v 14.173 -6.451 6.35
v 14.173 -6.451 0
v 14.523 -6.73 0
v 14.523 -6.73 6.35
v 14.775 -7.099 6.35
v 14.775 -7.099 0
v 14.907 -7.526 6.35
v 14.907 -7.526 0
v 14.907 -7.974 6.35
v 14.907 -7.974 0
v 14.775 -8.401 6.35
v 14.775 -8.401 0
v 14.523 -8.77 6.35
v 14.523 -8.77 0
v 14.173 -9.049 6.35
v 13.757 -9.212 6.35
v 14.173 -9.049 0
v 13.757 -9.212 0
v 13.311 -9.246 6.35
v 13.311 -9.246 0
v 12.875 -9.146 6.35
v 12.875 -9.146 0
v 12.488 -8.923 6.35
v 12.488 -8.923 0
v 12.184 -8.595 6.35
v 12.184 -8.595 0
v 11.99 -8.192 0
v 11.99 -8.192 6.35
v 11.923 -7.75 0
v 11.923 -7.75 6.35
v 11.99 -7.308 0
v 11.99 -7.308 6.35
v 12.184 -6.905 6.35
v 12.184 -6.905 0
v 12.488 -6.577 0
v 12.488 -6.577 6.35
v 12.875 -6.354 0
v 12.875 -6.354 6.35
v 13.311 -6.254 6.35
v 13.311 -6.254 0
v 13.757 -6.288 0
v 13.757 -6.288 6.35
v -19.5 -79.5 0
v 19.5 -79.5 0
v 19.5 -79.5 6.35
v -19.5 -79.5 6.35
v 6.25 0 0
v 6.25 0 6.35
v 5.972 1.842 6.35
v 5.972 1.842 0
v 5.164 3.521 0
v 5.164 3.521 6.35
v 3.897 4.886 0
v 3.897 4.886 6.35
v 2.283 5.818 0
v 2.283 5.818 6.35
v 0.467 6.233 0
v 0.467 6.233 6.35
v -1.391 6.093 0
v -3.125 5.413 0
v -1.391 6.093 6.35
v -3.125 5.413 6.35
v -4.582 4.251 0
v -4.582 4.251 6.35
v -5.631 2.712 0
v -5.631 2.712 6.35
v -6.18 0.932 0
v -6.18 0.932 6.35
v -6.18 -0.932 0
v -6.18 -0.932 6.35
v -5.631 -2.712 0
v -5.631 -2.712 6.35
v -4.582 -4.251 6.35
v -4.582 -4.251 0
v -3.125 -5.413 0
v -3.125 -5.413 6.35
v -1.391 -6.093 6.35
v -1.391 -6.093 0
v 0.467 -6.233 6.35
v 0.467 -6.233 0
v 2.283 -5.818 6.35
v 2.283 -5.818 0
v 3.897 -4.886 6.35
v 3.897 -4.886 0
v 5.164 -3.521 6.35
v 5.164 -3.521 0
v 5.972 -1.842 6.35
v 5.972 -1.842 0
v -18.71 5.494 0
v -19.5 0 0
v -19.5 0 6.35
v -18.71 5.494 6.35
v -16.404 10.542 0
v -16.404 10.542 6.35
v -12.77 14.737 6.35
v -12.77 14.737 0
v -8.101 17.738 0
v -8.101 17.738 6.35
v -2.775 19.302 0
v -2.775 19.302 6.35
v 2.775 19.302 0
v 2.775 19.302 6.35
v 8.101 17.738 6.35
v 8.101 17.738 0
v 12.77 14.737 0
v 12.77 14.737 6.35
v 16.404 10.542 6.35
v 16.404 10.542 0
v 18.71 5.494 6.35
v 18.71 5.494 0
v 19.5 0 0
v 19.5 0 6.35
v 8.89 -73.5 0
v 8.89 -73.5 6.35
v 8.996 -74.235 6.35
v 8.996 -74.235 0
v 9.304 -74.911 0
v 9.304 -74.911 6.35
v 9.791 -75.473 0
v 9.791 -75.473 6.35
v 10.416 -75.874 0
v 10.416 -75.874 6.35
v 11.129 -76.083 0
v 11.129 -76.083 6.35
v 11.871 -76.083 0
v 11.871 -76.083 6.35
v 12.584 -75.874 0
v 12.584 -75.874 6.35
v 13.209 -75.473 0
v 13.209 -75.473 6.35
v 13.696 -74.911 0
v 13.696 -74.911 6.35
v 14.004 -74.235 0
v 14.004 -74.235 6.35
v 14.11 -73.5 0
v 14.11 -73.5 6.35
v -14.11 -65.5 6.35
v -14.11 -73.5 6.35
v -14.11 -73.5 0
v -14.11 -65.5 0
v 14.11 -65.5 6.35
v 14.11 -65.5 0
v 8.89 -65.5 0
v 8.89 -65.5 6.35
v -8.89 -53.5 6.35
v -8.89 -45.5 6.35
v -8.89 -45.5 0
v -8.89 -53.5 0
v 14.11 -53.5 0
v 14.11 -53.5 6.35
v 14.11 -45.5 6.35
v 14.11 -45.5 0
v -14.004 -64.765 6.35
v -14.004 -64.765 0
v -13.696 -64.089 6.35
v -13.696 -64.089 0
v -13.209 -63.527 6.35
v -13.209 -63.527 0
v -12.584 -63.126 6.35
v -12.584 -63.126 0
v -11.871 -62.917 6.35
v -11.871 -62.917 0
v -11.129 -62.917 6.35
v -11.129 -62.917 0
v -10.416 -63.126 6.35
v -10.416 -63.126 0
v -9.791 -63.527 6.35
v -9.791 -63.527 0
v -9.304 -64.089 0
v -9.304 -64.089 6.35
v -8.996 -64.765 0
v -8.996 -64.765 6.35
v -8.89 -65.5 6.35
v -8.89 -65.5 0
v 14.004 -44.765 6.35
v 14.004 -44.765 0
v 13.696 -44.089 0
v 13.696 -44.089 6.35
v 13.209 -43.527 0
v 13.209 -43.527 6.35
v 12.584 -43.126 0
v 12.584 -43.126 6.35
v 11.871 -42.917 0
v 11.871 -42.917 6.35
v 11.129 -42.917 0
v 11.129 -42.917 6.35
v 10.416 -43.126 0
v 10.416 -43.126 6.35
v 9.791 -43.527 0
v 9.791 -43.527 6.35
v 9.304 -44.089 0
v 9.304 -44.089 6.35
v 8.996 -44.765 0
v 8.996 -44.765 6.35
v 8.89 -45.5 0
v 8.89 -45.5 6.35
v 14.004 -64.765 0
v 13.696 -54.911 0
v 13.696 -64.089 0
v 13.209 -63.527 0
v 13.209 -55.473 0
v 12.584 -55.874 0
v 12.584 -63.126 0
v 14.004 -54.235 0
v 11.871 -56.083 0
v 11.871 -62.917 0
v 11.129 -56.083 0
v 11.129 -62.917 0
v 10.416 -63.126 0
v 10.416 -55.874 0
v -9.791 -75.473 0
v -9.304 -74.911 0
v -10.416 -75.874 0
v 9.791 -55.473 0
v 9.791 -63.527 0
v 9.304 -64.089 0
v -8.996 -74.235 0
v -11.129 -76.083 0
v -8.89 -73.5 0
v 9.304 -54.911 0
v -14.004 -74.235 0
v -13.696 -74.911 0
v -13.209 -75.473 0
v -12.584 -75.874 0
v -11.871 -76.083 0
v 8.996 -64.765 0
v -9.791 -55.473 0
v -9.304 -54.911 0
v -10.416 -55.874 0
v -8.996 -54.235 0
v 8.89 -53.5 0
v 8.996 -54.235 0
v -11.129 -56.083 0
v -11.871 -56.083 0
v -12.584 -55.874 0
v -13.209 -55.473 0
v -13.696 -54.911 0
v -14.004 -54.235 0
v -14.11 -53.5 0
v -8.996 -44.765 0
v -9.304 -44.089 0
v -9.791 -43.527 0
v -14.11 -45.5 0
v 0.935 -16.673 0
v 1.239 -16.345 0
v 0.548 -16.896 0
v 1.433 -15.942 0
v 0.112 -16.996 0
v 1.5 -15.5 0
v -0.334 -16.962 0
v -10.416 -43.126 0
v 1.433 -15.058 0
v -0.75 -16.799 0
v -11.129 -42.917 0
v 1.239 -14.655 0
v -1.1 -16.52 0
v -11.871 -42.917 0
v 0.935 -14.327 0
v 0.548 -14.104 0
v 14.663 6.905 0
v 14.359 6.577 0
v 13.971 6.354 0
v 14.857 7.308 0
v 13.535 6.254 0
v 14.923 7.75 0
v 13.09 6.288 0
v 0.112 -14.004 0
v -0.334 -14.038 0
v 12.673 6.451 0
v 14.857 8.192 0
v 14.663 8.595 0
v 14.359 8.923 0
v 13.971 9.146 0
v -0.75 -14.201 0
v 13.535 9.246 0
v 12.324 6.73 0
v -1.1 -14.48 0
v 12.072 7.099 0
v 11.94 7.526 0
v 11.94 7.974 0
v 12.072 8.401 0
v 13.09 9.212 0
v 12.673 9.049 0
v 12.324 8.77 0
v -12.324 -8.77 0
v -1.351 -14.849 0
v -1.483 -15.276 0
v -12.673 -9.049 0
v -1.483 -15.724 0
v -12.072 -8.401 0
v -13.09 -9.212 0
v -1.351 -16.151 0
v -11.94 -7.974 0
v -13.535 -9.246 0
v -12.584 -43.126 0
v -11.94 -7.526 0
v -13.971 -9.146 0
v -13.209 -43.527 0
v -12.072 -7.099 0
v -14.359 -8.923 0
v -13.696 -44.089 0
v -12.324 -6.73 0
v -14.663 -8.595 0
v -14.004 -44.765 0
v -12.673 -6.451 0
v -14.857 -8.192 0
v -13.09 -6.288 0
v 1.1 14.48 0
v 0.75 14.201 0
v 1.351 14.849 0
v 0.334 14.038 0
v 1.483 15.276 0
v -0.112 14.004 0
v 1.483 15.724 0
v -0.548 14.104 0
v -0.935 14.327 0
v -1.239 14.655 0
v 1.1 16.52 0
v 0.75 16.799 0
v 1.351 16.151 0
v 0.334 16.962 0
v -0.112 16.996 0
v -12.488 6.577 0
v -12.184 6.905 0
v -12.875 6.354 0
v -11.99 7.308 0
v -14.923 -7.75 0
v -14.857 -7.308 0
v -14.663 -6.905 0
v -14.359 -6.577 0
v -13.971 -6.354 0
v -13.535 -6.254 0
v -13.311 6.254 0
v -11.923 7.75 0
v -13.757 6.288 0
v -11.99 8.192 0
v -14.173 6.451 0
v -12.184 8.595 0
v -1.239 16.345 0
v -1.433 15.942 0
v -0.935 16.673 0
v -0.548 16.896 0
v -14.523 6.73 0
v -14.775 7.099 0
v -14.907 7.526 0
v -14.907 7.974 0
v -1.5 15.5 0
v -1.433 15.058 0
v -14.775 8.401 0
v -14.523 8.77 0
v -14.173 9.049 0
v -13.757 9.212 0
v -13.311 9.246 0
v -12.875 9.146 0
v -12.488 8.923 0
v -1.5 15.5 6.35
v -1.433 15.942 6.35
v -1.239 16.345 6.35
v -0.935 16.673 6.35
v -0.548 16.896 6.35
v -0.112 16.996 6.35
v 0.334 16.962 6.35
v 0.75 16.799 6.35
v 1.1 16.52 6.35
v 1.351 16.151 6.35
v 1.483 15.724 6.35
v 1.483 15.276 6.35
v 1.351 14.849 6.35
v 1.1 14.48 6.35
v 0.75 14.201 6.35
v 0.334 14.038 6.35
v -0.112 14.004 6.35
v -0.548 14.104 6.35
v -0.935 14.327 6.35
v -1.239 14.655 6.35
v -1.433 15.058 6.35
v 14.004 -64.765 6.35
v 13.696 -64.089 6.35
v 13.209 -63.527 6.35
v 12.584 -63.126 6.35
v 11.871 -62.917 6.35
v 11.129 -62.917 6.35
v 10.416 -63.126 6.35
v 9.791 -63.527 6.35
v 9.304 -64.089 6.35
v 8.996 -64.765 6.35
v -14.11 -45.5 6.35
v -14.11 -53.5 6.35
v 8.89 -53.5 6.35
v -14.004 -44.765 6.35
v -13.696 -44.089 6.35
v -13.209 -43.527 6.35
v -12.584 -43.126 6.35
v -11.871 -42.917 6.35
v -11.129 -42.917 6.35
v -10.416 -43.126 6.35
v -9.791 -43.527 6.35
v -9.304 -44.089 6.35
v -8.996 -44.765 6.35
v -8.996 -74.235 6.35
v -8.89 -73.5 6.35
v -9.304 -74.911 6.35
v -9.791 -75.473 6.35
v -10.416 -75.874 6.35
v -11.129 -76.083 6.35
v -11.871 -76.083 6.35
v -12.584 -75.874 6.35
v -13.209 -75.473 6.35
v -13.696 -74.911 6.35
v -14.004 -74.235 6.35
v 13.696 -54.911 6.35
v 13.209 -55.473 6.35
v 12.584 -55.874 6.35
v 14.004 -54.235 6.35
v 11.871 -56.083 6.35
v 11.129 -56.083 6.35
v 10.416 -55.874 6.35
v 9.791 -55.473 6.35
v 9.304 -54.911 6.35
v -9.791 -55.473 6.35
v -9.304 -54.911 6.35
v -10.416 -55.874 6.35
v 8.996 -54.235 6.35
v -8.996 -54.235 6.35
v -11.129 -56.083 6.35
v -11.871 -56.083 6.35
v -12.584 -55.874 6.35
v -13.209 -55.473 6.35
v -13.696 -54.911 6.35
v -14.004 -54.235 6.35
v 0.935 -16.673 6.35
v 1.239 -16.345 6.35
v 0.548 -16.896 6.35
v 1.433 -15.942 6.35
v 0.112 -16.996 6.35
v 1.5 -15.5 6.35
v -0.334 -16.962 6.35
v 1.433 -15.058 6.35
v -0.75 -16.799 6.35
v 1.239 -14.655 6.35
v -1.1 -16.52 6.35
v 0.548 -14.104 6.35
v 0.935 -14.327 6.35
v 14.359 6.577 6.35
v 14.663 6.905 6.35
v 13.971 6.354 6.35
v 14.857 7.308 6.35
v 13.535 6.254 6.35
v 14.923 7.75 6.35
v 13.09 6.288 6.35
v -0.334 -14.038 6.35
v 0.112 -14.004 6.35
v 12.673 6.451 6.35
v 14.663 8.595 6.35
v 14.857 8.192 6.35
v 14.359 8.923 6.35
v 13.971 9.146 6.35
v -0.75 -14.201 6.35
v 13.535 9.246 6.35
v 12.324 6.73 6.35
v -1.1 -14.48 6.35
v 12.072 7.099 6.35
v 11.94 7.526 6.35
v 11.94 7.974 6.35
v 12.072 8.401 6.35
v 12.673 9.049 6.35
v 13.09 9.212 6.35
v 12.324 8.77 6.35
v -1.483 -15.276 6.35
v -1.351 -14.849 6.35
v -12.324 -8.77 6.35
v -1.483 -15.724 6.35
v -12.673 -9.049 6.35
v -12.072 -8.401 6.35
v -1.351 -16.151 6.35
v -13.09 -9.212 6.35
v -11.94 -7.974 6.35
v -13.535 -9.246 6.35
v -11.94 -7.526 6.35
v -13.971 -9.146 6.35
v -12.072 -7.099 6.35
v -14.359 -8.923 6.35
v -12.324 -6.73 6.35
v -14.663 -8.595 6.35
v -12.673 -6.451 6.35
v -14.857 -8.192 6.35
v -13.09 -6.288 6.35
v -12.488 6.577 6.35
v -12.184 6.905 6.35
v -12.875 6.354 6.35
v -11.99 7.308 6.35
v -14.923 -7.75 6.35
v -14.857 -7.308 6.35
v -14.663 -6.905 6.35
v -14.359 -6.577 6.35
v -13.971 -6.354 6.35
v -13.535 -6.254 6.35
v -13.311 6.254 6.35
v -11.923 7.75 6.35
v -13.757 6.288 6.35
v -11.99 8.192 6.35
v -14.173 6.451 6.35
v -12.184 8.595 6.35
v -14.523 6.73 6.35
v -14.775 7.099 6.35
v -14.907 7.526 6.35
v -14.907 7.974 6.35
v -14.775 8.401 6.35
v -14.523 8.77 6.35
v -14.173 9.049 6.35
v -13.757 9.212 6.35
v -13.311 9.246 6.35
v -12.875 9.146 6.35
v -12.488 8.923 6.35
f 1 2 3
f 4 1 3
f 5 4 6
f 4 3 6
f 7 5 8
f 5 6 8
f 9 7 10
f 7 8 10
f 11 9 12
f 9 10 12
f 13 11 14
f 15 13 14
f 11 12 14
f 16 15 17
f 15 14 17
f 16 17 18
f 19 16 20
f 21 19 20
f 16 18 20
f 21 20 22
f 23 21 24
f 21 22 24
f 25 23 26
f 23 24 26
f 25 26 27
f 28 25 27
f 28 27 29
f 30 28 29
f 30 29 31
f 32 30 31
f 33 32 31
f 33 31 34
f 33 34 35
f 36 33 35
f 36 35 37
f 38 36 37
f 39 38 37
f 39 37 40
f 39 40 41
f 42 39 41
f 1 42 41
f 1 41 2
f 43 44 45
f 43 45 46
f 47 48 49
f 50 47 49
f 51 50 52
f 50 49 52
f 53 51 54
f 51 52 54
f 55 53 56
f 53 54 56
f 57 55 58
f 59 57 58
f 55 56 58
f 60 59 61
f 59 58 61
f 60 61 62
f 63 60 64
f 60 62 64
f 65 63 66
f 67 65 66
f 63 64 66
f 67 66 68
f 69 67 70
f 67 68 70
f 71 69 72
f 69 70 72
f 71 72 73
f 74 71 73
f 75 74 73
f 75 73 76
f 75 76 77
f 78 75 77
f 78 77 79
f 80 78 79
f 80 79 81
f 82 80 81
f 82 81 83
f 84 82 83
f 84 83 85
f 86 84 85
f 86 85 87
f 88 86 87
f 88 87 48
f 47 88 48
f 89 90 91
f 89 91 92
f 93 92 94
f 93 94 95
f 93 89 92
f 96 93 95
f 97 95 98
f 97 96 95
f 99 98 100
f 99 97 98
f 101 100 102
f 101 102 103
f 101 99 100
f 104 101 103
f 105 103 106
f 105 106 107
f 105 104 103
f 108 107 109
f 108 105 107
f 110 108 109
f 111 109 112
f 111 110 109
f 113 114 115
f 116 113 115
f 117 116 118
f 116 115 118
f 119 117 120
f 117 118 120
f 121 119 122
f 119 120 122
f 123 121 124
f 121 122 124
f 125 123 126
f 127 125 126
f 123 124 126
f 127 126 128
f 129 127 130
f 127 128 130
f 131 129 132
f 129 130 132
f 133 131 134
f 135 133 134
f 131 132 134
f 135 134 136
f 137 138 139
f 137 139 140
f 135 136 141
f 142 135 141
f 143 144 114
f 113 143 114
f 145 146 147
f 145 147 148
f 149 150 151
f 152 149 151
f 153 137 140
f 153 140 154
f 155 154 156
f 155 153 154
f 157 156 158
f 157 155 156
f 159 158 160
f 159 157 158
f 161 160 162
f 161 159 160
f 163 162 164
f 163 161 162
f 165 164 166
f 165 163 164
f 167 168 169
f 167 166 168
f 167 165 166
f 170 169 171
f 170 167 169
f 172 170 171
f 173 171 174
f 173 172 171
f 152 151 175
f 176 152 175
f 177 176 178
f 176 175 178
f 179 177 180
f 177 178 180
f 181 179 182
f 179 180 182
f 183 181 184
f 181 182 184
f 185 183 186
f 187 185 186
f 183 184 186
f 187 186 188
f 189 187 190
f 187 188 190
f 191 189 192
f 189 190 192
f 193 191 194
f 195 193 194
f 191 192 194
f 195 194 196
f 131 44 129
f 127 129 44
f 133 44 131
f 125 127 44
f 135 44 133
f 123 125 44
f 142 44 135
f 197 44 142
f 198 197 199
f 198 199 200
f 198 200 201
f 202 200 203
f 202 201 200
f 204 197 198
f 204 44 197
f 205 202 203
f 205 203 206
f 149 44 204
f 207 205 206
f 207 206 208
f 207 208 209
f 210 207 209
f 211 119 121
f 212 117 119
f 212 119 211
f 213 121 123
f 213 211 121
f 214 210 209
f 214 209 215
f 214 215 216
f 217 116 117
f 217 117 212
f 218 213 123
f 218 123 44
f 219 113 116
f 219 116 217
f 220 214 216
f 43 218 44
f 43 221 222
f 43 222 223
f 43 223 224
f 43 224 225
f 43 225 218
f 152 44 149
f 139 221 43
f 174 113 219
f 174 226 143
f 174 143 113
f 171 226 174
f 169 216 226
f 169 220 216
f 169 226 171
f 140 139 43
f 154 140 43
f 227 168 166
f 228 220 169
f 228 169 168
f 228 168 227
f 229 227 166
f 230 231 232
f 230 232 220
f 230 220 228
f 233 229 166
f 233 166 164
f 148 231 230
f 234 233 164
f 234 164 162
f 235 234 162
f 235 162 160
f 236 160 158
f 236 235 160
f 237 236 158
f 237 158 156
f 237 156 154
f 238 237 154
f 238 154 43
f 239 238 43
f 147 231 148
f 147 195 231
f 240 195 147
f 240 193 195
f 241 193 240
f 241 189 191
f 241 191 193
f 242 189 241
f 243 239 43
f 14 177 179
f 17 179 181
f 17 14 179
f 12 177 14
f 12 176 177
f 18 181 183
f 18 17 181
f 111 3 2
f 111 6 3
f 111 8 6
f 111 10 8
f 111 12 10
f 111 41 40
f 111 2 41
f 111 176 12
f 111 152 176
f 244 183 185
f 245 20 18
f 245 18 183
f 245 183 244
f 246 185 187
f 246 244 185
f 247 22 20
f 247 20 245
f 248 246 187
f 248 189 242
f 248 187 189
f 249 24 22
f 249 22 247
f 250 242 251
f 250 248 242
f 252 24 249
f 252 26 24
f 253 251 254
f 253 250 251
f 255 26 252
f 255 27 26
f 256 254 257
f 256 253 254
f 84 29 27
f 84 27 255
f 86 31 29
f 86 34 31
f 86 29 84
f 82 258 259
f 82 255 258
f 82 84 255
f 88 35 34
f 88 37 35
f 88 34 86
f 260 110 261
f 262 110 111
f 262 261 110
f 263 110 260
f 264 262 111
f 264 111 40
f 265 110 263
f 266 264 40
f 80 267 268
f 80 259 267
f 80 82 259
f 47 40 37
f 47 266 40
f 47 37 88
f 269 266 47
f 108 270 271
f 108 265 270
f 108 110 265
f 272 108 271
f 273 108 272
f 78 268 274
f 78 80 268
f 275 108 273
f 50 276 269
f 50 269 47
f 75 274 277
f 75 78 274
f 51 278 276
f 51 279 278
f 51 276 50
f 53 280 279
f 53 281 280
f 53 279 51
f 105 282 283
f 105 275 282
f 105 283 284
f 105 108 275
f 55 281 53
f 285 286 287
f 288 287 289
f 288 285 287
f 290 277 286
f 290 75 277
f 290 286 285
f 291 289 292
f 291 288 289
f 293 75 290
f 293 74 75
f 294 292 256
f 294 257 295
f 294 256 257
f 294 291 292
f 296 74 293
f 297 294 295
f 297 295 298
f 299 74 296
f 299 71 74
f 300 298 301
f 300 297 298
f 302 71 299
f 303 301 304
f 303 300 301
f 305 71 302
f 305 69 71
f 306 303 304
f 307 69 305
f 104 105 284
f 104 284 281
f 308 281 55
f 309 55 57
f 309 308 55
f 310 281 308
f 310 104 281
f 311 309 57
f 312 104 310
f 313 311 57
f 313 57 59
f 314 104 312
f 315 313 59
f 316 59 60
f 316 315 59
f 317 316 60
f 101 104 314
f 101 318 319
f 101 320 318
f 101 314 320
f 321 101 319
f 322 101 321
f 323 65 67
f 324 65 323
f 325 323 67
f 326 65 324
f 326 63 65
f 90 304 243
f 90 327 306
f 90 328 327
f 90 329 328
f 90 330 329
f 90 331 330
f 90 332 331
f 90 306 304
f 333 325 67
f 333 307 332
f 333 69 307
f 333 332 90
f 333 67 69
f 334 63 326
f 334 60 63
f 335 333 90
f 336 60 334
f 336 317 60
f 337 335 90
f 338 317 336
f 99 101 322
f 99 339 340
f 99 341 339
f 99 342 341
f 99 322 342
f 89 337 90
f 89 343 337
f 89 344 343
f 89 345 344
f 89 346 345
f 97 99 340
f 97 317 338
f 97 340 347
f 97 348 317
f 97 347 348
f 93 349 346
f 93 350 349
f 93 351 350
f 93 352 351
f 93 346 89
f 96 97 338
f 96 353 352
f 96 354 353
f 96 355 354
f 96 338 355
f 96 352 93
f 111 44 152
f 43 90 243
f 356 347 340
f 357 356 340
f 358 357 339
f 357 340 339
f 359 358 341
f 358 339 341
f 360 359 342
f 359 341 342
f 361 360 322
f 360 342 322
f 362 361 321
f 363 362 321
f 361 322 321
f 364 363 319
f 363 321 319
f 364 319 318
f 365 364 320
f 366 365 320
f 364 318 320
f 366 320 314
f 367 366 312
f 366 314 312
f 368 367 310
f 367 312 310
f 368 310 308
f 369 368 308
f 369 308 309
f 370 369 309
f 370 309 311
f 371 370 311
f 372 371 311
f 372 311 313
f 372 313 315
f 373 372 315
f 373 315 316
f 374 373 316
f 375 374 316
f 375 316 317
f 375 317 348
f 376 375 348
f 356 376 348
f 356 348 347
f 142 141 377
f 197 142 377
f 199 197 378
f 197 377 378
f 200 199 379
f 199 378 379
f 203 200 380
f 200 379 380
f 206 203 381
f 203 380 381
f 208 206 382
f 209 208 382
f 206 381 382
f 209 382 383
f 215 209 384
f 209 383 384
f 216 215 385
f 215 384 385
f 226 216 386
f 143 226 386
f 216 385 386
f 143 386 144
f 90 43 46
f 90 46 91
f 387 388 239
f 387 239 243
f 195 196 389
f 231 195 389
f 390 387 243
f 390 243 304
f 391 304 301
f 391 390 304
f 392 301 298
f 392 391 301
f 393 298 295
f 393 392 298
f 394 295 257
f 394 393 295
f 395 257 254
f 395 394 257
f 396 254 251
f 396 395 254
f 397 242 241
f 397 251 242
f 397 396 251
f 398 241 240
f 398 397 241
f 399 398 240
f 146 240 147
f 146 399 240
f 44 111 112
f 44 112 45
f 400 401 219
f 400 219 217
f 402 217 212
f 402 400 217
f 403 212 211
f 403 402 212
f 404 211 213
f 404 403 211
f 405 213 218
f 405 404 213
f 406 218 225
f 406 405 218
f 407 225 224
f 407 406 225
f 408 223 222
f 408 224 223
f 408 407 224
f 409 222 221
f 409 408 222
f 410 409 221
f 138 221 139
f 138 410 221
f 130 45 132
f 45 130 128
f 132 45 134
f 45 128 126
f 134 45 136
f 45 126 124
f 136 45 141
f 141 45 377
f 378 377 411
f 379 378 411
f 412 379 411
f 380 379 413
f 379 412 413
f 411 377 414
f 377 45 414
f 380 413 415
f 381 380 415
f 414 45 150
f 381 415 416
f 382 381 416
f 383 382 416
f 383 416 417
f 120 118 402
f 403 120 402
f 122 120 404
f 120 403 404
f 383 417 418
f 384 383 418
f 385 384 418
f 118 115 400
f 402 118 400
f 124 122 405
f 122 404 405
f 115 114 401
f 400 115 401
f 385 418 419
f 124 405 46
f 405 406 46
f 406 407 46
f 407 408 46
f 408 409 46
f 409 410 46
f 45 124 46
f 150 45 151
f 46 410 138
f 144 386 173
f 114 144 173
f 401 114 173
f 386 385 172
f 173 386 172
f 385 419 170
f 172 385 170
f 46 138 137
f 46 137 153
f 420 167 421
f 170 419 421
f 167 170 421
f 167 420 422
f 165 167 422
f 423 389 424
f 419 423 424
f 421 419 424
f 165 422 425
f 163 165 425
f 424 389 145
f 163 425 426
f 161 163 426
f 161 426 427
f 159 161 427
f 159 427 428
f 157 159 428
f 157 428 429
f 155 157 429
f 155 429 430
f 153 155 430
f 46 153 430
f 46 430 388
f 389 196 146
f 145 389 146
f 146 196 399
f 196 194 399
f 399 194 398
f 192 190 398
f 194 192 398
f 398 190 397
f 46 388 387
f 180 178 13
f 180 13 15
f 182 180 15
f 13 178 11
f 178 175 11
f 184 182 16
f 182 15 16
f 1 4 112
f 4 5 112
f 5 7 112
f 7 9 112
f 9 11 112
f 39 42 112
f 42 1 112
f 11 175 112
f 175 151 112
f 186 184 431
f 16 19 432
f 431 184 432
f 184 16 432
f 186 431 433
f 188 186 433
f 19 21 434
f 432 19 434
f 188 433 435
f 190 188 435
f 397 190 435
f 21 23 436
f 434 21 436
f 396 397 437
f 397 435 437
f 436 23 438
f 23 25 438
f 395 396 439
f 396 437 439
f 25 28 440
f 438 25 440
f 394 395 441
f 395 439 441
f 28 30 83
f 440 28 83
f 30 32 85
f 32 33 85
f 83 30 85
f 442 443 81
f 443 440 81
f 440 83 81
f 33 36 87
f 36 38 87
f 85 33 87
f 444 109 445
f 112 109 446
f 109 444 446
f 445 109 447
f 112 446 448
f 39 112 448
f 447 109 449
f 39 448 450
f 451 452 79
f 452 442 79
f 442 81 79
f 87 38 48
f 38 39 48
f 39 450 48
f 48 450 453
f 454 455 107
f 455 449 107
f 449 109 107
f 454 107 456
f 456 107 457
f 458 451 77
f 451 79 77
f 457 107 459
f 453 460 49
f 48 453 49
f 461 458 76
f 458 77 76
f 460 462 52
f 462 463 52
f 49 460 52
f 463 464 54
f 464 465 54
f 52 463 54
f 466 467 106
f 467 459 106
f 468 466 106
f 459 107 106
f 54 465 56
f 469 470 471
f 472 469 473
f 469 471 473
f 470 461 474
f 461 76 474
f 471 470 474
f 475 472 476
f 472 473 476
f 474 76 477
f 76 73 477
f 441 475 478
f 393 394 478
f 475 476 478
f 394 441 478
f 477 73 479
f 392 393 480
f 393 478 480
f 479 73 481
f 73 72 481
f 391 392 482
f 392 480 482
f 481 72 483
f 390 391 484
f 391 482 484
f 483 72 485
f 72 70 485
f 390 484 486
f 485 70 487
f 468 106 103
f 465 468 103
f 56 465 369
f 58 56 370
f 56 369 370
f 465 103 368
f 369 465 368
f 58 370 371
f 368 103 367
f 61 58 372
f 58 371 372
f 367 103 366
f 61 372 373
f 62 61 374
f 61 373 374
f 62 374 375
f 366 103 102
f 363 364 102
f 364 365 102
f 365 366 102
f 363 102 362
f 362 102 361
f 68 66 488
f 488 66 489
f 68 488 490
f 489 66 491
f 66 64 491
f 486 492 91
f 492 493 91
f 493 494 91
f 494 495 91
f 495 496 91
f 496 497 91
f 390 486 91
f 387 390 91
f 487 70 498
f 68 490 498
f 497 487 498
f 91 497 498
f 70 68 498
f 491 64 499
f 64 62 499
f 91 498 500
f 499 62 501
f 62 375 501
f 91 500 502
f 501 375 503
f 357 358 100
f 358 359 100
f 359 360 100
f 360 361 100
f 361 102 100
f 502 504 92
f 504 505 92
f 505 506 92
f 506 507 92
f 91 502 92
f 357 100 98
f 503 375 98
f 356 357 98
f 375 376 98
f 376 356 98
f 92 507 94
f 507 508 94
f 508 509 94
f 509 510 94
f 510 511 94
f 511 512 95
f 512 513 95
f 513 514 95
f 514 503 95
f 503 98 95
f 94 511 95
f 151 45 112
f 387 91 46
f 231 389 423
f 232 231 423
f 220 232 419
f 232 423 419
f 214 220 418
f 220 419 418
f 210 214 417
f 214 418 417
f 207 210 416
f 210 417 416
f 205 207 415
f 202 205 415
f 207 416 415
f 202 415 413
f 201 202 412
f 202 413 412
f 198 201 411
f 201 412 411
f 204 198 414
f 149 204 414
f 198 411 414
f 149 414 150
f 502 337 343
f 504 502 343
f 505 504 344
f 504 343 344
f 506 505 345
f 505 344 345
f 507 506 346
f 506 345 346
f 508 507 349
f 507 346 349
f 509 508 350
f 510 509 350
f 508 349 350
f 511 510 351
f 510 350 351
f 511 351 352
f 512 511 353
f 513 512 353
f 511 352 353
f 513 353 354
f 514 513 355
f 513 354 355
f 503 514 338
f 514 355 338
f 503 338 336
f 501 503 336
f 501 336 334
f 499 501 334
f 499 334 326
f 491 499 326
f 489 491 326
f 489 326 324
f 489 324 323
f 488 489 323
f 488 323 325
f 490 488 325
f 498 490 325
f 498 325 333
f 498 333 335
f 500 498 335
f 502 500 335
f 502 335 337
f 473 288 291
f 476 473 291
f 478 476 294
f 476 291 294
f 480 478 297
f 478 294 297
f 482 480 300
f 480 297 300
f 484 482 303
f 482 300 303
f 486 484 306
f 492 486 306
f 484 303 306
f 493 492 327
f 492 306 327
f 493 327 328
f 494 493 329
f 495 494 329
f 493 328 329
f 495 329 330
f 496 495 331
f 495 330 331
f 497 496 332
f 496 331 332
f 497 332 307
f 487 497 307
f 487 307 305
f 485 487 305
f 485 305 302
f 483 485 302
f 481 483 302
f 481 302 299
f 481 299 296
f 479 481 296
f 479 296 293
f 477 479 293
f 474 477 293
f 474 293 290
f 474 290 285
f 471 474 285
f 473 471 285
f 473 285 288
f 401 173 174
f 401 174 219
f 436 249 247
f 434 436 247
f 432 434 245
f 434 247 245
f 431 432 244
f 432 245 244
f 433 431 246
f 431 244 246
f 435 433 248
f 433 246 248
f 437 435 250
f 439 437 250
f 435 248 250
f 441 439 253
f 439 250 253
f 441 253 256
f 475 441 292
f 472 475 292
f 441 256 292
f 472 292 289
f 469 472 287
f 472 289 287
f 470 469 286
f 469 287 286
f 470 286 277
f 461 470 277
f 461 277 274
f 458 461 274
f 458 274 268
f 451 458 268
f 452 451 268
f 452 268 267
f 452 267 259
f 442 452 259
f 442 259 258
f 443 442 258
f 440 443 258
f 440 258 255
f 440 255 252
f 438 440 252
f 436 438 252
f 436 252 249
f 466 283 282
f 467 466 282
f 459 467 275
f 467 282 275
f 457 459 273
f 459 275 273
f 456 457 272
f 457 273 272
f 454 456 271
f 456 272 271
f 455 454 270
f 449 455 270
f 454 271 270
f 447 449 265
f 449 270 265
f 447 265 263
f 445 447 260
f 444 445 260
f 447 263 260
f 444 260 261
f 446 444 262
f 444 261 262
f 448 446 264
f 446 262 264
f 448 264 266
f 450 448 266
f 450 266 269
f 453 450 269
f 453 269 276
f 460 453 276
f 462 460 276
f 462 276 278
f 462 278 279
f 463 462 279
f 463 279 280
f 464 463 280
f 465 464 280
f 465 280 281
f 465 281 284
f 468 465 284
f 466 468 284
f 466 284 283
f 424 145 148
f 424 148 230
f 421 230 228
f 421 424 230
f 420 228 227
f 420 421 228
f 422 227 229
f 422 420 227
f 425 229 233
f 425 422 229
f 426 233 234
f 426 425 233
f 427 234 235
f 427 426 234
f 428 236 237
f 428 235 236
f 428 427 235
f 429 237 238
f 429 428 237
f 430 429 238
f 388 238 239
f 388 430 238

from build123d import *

# Parameters (mm, degrees)
BOSS_EXTRUDE1_DEPTH             = 6.35
CUT_EXTRUDE1_REACH              = 84.103
CUT_EXTRUDE2_REACH              = 84.103
SKETCH3_R                       = 6.25
F_3_0MM_CLEARANCE_DOWEL_HOLE1_D = 3
CIRPATTERN1_COUNT               = 6


with BuildPart() as part:
    # Sketch1 → Boss-Extrude1 (new body)
    with BuildSketch(Plane.XY):
        with BuildLine():
            Line((19.5, 0), (19.5, -79.5))
            Line((19.5, -79.5), (-19.5, -79.5))
            Line((-19.5, -79.5), (-19.5, 0))
            ThreePointArc((-19.5, 0), (0, 19.5), (19.5, 0))
        make_face()
    extrude(amount=BOSS_EXTRUDE1_DEPTH)

    # Sketch2 → Cut-Extrude1 (cut, up to next)
    with BuildSketch(Plane.XY.offset(6.35), mode=Mode.PRIVATE) as cut_extrude1_sk1:
        with BuildLine():
            Line((-14.11, -73.5), (-14.11, -65.5))
            ThreePointArc((-14.11, -65.5), (-11.5, -62.89), (-8.89, -65.5))
            Line((-8.89, -65.5), (-8.89, -73.5))
            ThreePointArc((-8.89, -73.5), (-11.5, -76.11), (-14.11, -73.5))
        make_face()
    cut_extrude1_tool1 = extrude(cut_extrude1_sk1.sketch, amount=-CUT_EXTRUDE1_REACH, mode=Mode.PRIVATE) & part.part
    # Sketch2 → Cut-Extrude1 (cut, up to next)
    with BuildSketch(Plane.XY.offset(6.35), mode=Mode.PRIVATE) as cut_extrude1_sk2:
        with BuildLine():
            Line((-14.11, -53.5), (-14.11, -45.5))
            ThreePointArc((-14.11, -45.5), (-11.5, -42.89), (-8.89, -45.5))
            Line((-8.89, -45.5), (-8.89, -53.5))
            ThreePointArc((-8.89, -53.5), (-11.5, -56.11), (-14.11, -53.5))
        make_face()
    cut_extrude1_tool2 = extrude(cut_extrude1_sk2.sketch, amount=-CUT_EXTRUDE1_REACH, mode=Mode.PRIVATE) & part.part
    # Sketch2 → Cut-Extrude1 (cut, up to next)
    with BuildSketch(Plane.XY.offset(6.35), mode=Mode.PRIVATE) as cut_extrude1_sk3:
        with BuildLine():
            Line((14.11, -73.5), (14.11, -65.5))
            ThreePointArc((14.11, -65.5), (11.5, -62.89), (8.89, -65.5))
            Line((8.89, -65.5), (8.89, -73.5))
            ThreePointArc((8.89, -73.5), (11.5, -76.11), (14.11, -73.5))
        make_face()
    cut_extrude1_tool3 = extrude(cut_extrude1_sk3.sketch, amount=-CUT_EXTRUDE1_REACH, mode=Mode.PRIVATE) & part.part
    # Sketch2 → Cut-Extrude1 (cut, up to next)
    with BuildSketch(Plane.XY.offset(6.35), mode=Mode.PRIVATE) as cut_extrude1_sk4:
        with BuildLine():
            Line((14.11, -53.5), (14.11, -45.5))
            ThreePointArc((14.11, -45.5), (11.5, -42.89), (8.89, -45.5))
            Line((8.89, -45.5), (8.89, -53.5))
            ThreePointArc((8.89, -53.5), (11.5, -56.11), (14.11, -53.5))
        make_face()
    cut_extrude1_tool4 = extrude(cut_extrude1_sk4.sketch, amount=-CUT_EXTRUDE1_REACH, mode=Mode.PRIVATE) & part.part
    add(cut_extrude1_tool1.solids().sort_by_distance((-11.5, -69.5, 6.35))[0], mode=Mode.SUBTRACT)
    add(cut_extrude1_tool2.solids().sort_by_distance((-11.5, -49.5, 6.35))[0], mode=Mode.SUBTRACT)
    add(cut_extrude1_tool3.solids().sort_by_distance((11.5, -69.5, 6.35))[0], mode=Mode.SUBTRACT)
    add(cut_extrude1_tool4.solids().sort_by_distance((11.5, -49.5, 6.35))[0], mode=Mode.SUBTRACT)

    # Sketch3 → Cut-Extrude2 (cut, up to next)
    with BuildSketch(Plane.XY.offset(6.35), mode=Mode.PRIVATE) as cut_extrude2_sk1:
        Circle(SKETCH3_R)
    cut_extrude2_tool1 = extrude(cut_extrude2_sk1.sketch, amount=-CUT_EXTRUDE2_REACH, mode=Mode.PRIVATE) & part.part
    add(cut_extrude2_tool1.solids().sort_by_distance((0, 0, 6.35))[0], mode=Mode.SUBTRACT)

    # Ø3.0mm Clearance Dowel Hole1 (through all)
    with Locations(Plane(origin=(0, 15.5, 6.35), x_dir=(1, 0, 0), z_dir=(0, 0, 1))):
        with Locations((0, 0)):
            f_3_0mm_clearance_dowel_hole1 = Hole(F_3_0MM_CLEARANCE_DOWEL_HOLE1_D / 2)

    # CirPattern1: Ø3.0mm Clearance Dowel Hole1 ×6 about axis
    cirpattern1_axis = Axis((0, 0, 0), (0, 0, 1))
    for i in range(1, CIRPATTERN1_COUNT):
        add(f_3_0mm_clearance_dowel_hole1.rotate(cirpattern1_axis, i * 360 / CIRPATTERN1_COUNT), mode=Mode.SUBTRACT)


solid = part.part
